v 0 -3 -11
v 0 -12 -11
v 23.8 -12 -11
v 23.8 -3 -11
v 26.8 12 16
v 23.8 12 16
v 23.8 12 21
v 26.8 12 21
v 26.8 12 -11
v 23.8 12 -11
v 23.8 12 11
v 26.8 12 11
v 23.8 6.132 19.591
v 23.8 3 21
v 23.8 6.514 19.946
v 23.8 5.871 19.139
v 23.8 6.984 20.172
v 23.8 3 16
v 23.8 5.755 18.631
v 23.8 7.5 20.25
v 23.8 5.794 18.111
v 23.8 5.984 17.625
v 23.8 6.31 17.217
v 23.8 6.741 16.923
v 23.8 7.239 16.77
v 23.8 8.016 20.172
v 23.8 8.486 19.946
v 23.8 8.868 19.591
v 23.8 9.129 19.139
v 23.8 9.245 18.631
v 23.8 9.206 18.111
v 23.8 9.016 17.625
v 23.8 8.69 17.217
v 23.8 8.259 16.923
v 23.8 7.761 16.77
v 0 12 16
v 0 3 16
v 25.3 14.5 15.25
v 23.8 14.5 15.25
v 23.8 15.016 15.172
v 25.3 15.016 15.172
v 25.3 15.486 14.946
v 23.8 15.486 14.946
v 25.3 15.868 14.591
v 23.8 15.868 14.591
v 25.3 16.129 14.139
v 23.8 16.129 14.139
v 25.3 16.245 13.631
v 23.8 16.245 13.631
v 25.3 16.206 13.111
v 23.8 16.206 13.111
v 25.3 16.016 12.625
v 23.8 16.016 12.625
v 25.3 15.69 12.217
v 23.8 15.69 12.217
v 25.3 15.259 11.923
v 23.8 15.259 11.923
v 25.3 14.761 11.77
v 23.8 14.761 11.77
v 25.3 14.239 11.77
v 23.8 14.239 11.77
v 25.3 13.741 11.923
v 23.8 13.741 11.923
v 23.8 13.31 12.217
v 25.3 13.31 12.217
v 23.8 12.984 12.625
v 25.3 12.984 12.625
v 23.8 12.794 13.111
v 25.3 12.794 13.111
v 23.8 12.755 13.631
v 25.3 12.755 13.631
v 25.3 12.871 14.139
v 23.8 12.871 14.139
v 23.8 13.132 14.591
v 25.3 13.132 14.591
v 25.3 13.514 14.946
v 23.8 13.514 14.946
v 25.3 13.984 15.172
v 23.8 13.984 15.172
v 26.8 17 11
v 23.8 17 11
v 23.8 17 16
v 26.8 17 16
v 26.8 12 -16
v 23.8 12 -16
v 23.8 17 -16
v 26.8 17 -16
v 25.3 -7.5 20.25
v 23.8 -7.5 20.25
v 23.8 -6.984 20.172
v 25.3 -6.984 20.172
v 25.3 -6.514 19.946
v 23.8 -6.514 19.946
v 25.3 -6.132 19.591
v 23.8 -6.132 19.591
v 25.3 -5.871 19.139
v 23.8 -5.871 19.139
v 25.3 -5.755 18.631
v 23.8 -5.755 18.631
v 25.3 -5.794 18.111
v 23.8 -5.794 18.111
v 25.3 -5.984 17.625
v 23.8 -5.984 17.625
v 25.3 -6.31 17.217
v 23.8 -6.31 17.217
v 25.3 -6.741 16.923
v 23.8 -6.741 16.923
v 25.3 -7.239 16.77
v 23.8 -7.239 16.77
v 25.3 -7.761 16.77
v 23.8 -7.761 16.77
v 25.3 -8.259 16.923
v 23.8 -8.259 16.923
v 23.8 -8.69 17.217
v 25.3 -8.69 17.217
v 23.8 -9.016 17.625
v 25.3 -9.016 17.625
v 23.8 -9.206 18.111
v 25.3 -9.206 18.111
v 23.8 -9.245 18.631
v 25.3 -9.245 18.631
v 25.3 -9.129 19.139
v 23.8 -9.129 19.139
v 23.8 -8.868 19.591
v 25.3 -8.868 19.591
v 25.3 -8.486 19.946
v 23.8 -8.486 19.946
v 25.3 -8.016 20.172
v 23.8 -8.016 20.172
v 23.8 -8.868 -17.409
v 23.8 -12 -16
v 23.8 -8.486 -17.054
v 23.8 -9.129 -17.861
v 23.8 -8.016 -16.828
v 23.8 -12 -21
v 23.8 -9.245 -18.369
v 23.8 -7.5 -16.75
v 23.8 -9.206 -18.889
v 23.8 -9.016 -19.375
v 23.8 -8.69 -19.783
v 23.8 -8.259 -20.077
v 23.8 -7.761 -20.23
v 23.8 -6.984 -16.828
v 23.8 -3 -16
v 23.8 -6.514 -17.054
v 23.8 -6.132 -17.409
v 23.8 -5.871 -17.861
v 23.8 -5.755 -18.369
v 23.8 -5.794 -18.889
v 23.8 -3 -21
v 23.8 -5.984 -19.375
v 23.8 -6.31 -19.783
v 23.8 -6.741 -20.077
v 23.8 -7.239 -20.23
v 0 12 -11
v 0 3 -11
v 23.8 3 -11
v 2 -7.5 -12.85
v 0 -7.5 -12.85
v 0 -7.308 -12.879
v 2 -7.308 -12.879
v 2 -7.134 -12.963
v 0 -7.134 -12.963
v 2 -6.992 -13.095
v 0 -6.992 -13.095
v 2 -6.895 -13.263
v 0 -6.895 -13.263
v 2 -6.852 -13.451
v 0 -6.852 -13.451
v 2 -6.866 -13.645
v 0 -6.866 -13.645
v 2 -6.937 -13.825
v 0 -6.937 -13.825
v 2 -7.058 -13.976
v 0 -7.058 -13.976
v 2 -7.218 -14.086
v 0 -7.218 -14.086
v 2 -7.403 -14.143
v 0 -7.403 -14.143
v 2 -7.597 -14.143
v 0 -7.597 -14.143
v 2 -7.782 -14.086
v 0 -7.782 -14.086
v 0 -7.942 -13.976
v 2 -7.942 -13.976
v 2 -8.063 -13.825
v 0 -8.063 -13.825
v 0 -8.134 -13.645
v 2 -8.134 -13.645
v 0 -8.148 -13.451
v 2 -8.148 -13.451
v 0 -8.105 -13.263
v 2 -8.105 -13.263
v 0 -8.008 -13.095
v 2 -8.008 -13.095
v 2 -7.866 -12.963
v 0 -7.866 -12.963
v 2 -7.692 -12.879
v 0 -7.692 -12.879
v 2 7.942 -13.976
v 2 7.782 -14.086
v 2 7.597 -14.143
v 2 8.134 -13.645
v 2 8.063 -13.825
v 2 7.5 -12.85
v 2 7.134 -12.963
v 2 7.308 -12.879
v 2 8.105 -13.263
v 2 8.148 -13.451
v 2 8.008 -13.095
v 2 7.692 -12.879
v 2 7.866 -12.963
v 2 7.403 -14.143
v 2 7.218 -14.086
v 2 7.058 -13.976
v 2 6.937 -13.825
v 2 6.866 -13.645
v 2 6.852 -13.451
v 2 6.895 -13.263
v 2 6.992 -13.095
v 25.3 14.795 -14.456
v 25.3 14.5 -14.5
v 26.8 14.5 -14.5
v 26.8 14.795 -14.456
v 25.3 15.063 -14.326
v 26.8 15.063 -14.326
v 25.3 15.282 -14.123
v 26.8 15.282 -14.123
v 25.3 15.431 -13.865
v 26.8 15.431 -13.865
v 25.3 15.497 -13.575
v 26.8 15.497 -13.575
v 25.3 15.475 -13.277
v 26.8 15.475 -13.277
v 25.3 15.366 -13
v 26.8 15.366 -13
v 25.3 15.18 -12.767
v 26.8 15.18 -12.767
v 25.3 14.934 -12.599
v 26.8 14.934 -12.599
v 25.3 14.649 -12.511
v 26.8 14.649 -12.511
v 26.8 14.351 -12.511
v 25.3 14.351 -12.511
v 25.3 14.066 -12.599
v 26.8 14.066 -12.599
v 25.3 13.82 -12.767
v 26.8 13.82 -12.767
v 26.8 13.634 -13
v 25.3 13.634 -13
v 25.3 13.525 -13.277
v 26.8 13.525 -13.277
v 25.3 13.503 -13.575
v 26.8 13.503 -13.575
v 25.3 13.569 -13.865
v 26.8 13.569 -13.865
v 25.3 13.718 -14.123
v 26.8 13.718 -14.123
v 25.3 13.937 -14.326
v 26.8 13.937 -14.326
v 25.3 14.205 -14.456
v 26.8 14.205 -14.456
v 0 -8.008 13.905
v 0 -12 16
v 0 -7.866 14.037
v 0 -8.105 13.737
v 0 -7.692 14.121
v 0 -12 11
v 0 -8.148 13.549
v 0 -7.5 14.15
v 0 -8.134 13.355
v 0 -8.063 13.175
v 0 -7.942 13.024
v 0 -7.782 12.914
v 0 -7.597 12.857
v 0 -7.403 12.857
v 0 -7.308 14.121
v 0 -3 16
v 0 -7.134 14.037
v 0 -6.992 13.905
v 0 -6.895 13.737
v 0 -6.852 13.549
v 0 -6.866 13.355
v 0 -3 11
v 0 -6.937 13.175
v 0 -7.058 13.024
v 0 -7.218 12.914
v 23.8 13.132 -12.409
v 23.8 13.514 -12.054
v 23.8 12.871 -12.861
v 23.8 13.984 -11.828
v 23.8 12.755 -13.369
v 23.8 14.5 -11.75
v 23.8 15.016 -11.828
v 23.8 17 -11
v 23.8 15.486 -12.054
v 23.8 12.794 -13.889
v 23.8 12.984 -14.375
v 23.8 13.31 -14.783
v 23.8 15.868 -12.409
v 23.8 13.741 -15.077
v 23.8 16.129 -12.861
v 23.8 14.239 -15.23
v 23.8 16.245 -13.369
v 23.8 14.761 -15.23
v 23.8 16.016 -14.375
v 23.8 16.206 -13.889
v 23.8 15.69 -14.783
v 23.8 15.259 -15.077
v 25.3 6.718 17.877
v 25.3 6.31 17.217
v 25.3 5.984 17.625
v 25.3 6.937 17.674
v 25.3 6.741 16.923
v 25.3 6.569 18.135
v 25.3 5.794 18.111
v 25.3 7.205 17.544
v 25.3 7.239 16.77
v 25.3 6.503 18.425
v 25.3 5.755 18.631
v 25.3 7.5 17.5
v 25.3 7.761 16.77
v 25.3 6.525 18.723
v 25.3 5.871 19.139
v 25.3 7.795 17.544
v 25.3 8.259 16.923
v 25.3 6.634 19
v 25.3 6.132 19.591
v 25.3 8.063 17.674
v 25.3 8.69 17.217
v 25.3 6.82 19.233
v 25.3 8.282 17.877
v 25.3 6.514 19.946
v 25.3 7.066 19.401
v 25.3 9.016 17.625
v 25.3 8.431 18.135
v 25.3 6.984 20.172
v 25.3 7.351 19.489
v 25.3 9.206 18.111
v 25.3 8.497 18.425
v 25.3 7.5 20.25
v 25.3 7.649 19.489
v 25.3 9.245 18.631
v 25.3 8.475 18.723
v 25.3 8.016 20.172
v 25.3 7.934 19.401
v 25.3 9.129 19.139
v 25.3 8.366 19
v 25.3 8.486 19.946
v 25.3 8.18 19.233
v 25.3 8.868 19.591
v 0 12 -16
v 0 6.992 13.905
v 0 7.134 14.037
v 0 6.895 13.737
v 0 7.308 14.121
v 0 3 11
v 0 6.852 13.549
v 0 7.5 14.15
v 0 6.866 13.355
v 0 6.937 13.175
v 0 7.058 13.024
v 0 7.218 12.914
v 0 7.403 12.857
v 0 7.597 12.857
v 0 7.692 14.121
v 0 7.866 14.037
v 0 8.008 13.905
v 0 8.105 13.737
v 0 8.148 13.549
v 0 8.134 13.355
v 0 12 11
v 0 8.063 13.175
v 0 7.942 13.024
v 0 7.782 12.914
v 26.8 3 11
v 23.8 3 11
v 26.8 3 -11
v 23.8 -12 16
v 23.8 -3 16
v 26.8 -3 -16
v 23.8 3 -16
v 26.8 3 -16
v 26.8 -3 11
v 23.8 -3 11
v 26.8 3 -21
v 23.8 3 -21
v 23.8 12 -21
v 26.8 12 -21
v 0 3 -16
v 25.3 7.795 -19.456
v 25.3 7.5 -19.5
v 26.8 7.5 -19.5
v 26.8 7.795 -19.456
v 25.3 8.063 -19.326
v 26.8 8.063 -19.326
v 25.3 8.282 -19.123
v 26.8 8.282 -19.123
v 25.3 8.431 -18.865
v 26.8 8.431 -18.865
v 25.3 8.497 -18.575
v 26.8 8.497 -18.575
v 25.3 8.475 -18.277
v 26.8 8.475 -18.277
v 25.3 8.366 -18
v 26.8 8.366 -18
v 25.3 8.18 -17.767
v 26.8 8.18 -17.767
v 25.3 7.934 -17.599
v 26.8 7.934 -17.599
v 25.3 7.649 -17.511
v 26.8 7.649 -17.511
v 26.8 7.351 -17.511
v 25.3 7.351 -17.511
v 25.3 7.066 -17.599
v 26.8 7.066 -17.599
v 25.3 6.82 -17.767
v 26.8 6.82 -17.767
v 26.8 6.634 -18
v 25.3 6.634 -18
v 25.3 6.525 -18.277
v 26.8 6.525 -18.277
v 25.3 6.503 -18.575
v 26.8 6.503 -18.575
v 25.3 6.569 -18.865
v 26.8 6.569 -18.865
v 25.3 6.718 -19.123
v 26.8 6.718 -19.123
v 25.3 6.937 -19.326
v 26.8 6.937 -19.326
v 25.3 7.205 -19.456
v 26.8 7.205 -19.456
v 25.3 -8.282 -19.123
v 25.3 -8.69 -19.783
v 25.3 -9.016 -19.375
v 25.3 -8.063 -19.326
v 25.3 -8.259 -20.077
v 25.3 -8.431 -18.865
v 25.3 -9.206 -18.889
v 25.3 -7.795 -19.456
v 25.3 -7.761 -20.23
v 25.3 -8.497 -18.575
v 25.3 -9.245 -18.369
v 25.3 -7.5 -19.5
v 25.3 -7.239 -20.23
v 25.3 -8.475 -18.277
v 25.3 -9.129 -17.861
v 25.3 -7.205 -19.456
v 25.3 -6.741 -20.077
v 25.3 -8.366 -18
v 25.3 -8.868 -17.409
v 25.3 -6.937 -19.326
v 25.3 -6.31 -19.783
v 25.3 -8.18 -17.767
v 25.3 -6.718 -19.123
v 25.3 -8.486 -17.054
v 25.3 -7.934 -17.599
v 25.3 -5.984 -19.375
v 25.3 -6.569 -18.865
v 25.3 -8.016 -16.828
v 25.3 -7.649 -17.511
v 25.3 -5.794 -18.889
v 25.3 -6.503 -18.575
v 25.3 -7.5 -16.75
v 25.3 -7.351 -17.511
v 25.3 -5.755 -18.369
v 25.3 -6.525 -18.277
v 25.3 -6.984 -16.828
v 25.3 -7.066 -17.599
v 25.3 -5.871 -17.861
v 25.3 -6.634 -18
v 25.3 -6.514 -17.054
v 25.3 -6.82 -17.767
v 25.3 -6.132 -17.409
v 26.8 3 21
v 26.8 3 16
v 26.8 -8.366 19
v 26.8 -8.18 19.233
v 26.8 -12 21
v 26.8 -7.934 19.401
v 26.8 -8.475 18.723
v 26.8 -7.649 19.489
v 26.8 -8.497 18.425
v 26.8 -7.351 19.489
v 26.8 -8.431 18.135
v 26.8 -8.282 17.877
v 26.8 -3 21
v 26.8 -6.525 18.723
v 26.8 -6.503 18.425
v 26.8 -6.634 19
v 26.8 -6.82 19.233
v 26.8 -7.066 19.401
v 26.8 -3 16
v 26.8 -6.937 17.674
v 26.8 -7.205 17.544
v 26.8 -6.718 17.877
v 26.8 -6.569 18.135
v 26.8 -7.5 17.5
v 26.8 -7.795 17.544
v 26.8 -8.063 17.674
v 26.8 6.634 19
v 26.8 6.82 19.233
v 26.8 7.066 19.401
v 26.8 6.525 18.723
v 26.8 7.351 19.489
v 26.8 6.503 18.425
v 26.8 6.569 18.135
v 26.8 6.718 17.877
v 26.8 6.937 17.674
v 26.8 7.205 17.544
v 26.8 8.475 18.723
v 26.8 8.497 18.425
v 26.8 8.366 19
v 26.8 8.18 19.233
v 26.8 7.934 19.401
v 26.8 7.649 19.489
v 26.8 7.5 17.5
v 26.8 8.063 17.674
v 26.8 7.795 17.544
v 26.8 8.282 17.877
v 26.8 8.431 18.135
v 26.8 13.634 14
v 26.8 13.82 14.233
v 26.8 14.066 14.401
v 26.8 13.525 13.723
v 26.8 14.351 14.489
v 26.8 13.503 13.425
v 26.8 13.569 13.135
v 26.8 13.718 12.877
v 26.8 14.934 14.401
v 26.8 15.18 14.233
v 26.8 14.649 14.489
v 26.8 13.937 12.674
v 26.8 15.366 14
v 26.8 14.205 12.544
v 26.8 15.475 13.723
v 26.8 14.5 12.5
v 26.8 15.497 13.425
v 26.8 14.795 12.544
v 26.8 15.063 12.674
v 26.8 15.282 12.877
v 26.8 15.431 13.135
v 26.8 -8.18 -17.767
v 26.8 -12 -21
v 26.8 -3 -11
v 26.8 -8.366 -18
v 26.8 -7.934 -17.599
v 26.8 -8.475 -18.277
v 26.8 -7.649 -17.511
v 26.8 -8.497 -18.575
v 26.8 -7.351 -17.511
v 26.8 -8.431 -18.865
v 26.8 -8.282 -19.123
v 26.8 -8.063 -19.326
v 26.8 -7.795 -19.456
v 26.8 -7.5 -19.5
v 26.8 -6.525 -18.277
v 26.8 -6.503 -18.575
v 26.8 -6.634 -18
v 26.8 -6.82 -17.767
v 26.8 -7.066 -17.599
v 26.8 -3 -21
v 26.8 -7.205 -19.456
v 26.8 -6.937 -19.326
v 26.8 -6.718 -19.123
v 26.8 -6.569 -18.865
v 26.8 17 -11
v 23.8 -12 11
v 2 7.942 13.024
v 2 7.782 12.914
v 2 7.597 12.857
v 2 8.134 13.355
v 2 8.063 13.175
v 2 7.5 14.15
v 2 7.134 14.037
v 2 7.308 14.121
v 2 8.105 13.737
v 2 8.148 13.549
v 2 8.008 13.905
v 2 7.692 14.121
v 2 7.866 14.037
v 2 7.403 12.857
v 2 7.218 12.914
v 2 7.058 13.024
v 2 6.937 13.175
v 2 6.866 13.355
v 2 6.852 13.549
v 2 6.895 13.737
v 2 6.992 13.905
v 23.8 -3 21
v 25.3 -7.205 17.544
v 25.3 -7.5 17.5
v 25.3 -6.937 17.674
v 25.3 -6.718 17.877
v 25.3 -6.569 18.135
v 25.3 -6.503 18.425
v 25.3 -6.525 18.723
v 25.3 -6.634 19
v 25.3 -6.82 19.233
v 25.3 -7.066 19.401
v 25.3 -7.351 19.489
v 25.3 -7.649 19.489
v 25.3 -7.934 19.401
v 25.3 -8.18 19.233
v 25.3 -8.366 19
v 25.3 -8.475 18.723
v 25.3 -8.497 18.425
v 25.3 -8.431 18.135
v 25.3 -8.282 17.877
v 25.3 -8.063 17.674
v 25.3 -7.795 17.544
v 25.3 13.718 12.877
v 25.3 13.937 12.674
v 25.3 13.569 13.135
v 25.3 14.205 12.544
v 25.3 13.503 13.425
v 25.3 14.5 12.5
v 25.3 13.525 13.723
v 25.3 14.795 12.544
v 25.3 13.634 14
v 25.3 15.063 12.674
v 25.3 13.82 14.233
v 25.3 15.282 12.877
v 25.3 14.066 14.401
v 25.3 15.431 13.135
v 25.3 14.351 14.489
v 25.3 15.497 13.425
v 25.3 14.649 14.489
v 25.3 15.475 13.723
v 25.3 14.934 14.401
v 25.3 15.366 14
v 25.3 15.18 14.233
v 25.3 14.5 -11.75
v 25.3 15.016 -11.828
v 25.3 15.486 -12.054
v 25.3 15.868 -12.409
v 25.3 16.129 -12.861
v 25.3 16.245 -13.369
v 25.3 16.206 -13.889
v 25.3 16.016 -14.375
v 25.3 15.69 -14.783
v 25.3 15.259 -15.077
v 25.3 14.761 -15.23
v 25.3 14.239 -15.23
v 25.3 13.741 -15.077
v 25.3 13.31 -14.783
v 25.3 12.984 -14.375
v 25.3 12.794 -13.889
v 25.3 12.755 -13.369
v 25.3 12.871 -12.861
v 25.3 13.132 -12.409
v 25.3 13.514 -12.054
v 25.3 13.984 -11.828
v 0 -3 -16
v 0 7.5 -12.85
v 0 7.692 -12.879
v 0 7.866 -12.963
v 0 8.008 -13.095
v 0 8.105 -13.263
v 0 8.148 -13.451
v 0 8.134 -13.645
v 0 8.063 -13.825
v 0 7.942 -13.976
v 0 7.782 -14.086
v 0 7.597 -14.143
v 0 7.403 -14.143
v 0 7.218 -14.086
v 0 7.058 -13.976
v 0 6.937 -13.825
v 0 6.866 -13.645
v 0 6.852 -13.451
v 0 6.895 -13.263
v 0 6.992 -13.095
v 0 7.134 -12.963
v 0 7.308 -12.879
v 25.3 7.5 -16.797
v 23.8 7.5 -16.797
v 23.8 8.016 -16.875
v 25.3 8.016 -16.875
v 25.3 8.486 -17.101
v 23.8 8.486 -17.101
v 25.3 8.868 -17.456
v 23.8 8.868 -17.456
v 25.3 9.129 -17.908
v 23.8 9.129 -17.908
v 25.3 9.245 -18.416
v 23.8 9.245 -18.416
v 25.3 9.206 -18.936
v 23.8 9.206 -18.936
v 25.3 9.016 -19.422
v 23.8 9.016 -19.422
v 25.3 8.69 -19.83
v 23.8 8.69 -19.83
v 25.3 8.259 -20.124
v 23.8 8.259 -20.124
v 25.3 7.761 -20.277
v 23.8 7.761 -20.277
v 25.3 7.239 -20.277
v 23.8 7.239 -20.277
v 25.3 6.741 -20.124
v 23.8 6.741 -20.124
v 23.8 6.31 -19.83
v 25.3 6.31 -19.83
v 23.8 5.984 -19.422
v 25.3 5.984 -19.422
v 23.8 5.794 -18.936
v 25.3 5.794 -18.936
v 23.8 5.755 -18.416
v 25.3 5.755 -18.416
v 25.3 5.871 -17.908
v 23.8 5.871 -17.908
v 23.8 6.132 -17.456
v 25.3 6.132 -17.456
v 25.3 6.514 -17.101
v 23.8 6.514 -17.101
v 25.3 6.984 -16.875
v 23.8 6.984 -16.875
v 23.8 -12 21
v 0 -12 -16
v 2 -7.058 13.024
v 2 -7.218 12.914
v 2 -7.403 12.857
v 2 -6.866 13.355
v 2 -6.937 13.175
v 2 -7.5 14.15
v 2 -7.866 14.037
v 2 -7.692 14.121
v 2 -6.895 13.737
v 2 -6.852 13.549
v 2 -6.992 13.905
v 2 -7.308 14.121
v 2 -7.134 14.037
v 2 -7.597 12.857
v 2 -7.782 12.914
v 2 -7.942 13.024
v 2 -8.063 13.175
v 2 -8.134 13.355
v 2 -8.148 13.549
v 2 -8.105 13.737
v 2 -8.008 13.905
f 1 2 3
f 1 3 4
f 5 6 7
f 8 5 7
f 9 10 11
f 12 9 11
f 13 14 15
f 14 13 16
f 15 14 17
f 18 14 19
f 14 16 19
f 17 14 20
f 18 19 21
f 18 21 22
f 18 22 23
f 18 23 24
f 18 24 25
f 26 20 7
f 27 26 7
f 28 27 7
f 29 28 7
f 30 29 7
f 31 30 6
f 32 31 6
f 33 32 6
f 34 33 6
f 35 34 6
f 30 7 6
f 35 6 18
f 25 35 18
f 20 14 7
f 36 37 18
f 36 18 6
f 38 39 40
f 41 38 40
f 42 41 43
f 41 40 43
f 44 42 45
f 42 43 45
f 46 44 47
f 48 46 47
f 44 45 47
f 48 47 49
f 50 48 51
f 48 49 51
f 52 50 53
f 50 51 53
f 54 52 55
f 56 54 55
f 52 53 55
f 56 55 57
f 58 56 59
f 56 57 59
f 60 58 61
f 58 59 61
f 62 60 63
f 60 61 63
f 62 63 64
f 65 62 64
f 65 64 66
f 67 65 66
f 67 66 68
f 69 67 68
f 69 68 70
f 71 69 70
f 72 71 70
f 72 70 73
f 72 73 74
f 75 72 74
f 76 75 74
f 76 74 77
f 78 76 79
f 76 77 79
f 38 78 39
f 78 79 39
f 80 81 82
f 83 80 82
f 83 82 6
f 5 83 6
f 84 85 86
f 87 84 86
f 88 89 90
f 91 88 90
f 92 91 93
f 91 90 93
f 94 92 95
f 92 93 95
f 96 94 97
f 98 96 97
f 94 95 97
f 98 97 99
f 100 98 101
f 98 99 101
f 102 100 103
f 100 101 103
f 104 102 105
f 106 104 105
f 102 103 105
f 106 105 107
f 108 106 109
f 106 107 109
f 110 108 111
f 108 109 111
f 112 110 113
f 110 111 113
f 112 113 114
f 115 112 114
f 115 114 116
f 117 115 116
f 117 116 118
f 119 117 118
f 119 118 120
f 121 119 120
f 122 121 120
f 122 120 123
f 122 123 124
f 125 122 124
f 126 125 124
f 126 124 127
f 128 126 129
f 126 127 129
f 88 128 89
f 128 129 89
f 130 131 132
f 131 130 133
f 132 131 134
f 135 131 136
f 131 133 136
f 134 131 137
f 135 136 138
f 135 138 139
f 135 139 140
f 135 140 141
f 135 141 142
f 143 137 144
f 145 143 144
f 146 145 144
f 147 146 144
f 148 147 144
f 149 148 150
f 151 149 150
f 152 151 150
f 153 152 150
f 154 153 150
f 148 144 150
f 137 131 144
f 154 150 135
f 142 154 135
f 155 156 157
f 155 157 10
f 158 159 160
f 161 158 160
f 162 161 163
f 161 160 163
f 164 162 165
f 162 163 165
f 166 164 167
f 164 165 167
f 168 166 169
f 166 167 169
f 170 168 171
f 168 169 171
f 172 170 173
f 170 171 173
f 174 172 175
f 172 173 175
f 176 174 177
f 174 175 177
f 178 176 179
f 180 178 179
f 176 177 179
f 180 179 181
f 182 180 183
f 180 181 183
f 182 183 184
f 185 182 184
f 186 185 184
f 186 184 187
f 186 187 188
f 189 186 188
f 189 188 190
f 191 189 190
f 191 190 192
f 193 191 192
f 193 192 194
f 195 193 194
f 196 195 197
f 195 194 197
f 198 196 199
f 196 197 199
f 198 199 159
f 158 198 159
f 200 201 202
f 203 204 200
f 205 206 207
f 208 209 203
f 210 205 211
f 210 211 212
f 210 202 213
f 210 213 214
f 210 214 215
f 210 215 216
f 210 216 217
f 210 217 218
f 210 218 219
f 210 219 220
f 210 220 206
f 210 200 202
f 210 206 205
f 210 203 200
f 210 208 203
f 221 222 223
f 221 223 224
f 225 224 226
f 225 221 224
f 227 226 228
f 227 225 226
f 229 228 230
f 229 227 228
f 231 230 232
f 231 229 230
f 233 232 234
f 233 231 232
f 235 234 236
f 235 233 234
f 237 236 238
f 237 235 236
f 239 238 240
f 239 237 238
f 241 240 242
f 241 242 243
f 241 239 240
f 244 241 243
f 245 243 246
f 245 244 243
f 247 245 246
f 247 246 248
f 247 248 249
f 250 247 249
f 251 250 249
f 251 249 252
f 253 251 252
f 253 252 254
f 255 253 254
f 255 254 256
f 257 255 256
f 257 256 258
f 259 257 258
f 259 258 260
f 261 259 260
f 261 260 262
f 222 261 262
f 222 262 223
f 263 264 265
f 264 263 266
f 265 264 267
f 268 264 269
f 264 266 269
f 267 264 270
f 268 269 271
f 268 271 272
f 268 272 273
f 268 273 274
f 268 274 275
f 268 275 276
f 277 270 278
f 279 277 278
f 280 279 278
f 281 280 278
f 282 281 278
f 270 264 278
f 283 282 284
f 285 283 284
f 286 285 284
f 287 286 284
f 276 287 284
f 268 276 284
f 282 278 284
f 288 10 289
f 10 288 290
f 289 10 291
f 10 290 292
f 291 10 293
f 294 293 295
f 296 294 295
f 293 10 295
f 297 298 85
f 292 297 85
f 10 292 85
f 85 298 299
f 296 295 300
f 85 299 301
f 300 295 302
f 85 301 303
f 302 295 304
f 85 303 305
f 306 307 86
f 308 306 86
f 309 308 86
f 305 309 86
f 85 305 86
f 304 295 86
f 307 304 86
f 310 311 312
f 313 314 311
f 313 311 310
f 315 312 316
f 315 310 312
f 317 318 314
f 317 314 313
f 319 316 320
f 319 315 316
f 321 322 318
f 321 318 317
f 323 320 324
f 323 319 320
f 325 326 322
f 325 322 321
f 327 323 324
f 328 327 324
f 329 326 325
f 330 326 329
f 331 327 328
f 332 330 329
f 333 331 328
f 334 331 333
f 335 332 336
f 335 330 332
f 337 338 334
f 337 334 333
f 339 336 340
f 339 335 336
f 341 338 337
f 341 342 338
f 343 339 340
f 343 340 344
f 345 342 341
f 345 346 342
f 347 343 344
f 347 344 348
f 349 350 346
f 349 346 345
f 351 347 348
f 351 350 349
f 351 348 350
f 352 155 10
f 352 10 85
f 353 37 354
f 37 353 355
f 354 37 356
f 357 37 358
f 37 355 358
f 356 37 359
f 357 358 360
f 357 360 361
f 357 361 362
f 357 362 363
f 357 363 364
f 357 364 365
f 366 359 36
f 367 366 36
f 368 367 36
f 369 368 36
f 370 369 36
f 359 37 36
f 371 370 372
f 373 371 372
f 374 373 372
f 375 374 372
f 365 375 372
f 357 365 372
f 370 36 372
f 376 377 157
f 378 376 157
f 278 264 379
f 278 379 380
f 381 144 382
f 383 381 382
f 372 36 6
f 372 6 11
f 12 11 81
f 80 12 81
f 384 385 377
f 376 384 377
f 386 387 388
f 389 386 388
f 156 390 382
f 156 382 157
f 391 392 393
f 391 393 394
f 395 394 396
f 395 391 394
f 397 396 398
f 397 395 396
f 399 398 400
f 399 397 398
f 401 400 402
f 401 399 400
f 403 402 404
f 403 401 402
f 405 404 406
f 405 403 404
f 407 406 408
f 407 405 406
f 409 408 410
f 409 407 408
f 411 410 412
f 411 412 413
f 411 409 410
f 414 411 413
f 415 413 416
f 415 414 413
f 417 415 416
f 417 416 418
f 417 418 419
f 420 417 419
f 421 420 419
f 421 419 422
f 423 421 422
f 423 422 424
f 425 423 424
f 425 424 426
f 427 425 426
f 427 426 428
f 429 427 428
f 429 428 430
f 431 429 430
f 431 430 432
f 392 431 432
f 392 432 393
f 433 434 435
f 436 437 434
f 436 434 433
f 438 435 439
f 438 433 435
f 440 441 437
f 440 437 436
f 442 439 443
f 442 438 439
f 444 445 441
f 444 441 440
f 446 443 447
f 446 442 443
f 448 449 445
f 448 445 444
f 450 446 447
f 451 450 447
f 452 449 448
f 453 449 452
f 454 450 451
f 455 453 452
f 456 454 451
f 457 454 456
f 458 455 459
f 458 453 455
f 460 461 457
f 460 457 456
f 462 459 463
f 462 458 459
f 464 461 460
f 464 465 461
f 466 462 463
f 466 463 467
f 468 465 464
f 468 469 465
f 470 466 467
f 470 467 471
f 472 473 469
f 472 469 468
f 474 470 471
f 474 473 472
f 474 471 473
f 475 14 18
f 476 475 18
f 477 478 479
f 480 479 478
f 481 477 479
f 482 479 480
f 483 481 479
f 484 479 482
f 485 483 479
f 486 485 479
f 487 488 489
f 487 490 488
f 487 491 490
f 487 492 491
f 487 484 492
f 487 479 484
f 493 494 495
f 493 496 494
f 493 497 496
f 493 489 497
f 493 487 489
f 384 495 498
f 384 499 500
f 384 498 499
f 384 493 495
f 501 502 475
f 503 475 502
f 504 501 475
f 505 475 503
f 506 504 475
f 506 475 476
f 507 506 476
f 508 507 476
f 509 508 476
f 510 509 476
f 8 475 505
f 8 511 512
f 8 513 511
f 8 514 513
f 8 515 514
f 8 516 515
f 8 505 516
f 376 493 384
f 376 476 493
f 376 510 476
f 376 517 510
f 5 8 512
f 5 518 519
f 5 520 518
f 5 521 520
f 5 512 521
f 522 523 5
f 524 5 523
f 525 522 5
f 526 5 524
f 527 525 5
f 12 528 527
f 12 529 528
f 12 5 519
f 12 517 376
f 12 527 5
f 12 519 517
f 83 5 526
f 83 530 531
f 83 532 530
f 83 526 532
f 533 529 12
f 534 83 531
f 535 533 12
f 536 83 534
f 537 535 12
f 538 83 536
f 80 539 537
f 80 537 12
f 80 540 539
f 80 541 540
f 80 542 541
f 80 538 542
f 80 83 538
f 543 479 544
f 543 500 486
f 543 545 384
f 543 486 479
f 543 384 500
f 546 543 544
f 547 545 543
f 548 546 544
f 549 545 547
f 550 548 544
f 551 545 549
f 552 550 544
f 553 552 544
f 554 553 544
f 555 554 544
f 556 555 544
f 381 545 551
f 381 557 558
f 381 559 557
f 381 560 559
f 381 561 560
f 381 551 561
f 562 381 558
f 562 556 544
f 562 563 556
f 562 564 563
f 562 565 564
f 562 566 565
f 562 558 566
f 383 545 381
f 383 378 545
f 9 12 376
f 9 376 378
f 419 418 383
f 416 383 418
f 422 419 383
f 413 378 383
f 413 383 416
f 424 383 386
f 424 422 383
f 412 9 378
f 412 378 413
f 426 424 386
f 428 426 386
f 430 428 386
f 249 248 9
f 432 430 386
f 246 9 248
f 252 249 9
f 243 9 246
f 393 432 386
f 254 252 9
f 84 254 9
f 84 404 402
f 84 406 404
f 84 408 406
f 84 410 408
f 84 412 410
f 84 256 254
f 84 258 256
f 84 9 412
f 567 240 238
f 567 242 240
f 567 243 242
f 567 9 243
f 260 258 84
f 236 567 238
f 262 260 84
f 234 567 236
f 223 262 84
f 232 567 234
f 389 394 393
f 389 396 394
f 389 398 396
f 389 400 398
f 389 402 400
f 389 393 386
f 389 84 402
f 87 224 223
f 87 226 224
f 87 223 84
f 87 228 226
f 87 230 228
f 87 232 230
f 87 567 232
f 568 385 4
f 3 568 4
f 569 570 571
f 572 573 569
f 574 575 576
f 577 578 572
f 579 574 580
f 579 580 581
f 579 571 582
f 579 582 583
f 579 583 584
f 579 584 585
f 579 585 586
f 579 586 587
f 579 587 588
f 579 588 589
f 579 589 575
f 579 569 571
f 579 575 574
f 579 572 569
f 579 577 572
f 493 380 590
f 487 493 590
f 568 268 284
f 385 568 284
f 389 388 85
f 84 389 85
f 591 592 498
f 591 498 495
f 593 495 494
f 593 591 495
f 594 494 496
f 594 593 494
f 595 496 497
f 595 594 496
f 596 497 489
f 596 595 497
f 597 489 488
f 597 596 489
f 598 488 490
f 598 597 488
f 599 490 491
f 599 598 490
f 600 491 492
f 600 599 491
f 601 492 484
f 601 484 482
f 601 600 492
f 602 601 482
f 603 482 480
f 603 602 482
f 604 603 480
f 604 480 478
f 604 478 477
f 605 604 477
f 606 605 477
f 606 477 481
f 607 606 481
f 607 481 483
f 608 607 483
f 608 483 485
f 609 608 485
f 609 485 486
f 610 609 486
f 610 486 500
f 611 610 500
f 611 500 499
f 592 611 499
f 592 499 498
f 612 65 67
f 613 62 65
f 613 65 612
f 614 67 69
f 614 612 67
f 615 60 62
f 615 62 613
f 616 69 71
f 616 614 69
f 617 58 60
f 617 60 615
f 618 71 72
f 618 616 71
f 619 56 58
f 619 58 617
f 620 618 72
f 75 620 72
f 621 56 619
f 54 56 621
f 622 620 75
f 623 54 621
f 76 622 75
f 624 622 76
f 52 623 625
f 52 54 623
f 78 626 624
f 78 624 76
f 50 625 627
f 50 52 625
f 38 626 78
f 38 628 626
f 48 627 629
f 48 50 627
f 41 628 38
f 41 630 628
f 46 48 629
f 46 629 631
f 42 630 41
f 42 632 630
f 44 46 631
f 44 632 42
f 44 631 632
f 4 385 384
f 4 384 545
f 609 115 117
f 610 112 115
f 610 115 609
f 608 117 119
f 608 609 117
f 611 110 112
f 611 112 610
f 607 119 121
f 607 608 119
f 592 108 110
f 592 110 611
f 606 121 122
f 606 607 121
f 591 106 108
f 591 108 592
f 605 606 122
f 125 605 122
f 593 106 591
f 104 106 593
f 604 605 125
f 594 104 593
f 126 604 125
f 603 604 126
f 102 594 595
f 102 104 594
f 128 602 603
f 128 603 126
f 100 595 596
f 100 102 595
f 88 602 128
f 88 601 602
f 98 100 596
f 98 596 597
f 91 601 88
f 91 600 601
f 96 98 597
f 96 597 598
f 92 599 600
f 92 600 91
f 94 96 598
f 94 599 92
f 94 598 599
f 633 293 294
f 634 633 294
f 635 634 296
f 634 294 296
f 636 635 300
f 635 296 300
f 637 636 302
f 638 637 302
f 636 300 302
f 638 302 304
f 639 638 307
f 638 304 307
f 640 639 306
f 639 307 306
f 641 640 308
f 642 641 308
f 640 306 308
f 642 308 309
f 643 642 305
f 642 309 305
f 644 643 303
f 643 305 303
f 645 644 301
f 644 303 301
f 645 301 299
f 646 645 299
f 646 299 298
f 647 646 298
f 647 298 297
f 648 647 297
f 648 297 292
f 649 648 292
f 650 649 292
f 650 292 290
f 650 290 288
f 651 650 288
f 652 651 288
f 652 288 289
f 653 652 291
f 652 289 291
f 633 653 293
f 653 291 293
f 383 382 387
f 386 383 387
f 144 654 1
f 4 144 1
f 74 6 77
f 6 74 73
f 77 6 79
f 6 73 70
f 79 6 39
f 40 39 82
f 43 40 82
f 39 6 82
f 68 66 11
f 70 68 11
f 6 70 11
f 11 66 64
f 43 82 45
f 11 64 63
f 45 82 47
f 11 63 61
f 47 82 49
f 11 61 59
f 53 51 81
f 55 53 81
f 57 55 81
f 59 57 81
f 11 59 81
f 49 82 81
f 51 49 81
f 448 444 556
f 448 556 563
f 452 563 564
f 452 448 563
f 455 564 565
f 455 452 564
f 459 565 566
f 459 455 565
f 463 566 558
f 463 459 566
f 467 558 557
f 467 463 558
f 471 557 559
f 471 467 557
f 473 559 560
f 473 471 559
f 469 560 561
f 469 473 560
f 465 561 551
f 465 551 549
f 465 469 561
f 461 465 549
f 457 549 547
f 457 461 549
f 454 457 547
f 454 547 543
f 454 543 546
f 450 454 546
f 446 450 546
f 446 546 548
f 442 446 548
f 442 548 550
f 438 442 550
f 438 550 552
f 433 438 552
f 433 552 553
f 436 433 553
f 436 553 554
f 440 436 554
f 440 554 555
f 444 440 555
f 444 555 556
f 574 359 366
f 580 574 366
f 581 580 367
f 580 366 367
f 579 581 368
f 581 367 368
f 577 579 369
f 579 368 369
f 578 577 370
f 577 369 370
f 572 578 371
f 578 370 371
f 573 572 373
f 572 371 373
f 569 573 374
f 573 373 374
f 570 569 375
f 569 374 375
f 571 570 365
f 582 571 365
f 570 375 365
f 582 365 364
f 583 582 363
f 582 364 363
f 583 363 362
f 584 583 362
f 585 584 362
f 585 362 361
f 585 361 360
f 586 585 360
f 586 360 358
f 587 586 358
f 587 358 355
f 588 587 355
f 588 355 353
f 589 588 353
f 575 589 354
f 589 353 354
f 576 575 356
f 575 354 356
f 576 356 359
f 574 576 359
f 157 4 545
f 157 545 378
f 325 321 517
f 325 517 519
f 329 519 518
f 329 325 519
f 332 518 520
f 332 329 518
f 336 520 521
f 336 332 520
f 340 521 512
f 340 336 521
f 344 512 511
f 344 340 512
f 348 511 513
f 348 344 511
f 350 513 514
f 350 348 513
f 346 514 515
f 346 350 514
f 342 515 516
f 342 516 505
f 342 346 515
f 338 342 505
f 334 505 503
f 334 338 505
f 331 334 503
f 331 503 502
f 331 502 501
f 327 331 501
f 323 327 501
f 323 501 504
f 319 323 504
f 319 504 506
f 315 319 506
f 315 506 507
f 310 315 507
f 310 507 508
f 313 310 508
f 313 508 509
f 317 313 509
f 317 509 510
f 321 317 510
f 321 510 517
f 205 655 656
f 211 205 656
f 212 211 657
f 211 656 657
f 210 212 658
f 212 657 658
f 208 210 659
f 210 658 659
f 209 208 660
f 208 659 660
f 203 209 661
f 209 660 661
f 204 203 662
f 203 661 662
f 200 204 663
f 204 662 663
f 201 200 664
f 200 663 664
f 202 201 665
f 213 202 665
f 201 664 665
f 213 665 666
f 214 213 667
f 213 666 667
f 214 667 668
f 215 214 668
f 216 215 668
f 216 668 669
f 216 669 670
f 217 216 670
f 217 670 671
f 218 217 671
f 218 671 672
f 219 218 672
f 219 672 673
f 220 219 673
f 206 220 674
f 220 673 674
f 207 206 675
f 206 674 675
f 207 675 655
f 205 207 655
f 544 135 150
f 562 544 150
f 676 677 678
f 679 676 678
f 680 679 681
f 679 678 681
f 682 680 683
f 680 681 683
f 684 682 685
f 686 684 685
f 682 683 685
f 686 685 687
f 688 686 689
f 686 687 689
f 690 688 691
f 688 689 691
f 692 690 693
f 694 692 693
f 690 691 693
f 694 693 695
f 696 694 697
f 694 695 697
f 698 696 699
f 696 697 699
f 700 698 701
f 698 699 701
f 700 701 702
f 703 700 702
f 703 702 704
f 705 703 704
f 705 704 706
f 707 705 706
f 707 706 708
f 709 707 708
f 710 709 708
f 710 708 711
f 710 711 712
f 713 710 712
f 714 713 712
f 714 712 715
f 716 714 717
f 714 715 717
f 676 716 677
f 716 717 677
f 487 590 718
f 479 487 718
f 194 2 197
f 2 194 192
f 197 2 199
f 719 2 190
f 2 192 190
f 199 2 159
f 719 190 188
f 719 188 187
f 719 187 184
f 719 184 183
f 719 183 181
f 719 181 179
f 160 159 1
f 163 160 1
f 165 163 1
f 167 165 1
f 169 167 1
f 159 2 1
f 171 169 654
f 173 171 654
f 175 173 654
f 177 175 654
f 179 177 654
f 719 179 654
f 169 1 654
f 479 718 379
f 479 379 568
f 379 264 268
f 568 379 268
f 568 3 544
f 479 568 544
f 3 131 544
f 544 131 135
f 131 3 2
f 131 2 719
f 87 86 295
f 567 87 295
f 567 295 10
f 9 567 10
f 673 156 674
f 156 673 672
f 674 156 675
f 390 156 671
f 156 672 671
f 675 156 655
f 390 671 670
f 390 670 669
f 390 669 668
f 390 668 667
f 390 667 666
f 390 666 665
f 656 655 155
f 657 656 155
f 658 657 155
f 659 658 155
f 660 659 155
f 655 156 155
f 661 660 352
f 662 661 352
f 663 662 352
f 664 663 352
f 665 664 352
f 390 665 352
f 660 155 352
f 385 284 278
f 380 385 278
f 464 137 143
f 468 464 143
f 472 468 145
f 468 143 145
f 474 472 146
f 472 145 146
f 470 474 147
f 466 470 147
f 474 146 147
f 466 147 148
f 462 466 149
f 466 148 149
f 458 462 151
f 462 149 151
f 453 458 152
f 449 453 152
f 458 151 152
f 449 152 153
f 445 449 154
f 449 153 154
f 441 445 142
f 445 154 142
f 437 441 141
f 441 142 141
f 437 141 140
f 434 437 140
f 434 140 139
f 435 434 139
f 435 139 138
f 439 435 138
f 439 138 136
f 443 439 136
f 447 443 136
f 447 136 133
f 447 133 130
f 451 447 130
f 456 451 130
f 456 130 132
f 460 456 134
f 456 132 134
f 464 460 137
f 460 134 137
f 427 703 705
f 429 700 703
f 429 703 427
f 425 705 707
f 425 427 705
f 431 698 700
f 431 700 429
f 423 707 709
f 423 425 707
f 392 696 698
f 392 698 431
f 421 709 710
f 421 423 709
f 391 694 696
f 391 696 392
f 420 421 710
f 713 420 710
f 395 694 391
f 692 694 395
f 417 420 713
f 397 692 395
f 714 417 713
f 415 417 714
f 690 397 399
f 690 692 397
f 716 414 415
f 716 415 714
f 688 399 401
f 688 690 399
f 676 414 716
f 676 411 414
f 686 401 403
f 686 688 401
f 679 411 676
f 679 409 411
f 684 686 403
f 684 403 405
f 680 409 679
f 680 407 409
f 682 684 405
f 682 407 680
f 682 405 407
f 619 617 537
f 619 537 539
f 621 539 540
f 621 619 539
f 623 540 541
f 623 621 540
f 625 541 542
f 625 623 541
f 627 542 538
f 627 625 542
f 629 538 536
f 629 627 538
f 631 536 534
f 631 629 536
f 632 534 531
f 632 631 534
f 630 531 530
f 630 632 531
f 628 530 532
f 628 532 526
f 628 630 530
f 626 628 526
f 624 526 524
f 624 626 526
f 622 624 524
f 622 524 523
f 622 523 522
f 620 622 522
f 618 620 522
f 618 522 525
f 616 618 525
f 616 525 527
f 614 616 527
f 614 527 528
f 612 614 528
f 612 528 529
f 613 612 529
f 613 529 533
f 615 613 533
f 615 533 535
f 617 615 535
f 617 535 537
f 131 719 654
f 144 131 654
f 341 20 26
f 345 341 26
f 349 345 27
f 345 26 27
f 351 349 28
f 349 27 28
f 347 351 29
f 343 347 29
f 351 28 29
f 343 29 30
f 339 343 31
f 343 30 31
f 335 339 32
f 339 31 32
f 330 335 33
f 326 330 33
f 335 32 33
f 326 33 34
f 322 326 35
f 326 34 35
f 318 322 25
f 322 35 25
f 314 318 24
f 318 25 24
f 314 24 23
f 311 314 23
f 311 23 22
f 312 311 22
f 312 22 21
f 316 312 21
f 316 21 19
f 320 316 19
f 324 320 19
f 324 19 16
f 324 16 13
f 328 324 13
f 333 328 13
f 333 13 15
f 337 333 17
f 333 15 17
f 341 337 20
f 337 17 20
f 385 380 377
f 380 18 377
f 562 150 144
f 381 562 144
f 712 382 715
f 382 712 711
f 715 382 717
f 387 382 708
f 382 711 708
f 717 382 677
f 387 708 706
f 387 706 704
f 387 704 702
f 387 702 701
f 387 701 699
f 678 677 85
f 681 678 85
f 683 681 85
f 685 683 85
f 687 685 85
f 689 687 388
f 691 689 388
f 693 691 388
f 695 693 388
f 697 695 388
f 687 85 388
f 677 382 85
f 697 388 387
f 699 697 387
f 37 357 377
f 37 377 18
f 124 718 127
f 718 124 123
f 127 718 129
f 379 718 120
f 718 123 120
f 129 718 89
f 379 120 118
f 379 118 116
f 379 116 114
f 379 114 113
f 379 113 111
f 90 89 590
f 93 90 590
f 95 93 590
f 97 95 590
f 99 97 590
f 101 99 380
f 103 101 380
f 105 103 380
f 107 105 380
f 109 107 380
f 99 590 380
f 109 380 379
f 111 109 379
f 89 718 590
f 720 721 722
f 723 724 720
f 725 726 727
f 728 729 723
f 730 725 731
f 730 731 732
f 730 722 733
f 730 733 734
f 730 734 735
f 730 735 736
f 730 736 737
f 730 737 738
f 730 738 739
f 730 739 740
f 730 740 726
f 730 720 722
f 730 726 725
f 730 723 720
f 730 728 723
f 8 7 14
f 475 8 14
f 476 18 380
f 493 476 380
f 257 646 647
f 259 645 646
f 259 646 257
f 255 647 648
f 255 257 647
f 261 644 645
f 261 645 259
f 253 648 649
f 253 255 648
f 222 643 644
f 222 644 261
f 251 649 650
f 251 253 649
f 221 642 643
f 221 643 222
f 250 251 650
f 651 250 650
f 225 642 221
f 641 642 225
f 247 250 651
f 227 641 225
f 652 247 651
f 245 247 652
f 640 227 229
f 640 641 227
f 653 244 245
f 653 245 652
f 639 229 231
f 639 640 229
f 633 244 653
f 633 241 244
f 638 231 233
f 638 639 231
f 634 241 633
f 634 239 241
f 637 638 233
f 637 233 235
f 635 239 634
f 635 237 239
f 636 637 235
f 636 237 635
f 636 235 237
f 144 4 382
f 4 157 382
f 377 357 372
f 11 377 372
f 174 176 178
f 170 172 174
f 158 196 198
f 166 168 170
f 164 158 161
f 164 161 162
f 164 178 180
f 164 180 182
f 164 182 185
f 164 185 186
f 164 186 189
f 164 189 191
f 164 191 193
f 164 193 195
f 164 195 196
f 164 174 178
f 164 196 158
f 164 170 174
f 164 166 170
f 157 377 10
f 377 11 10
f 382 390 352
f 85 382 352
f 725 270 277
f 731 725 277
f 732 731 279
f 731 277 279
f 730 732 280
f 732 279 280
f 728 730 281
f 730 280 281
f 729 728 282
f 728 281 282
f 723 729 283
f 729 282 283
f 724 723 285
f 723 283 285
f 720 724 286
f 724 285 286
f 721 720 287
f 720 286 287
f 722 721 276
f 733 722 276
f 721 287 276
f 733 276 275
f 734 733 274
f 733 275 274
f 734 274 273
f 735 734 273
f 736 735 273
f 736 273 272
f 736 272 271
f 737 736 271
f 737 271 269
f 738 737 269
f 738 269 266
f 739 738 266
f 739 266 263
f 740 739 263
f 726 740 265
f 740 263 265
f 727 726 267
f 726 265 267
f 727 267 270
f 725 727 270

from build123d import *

# Parameters (mm, degrees)
SKETCH_1_W           = 32
SKETCH_1_H           = 24
EXTRUDE_1_DEPTH      = 23.8
SKETCH_7_R           = 0.65
CUT_EXTRUDE_1_DEPTH  = 2
SKETCH_8_OUTSIDE_W   = 43.31
SKETCH_8_OUTSIDE_H   = 35.31
SKETCH_8_OUTSIDE_W_2 = 5
SKETCH_8_OUTSIDE_H_2 = 9
CUT_EXTRUDE_2_DEPTH  = 32.087618114
SKETCH_9_R           = 1
SKETCH_9_W           = 22
SKETCH_9_H           = 6
EXTRUDE_2_DEPTH      = 3
SKETCH_11_R          = 1.75
CUT_EXTRUDE_3_DEPTH  = 1.5


with BuildPart() as part:
    # 草图1 → 凸台-拉伸1 (new body)
    with BuildSketch(Plane(origin=(0, 0, 0), x_dir=(0, 0, -1), z_dir=(1, 0, 0))):
        Rectangle(SKETCH_1_W, SKETCH_1_H)
    extrude(amount=EXTRUDE_1_DEPTH)

    # 草图7 → 切除-拉伸1 (cut)
    with BuildSketch(Plane.ZY):
        with Locations((13.5, 7.5)):
            Circle(SKETCH_7_R)
        with Locations((13.5, -7.5)):
            Circle(SKETCH_7_R)
        with Locations((-13.5, -7.5)):
            Circle(SKETCH_7_R)
        with Locations((-13.5, 7.5)):
            Circle(SKETCH_7_R)
    extrude(amount=-CUT_EXTRUDE_1_DEPTH, mode=Mode.SUBTRACT)

    # 草图8 outside → 切除-拉伸2 (cut, through all)
    with BuildSketch(Plane.ZY):
        Rectangle(SKETCH_8_OUTSIDE_W, SKETCH_8_OUTSIDE_H)
        with Locations((-13.5, -7.5)):
            Rectangle(SKETCH_8_OUTSIDE_W_2, SKETCH_8_OUTSIDE_H_2, mode=Mode.SUBTRACT)
        with Locations((-13.5, 7.5)):
            Rectangle(SKETCH_8_OUTSIDE_W_2, SKETCH_8_OUTSIDE_H_2, mode=Mode.SUBTRACT)
        with Locations((13.5, -7.5)):
            Rectangle(SKETCH_8_OUTSIDE_W_2, SKETCH_8_OUTSIDE_H_2, mode=Mode.SUBTRACT)
        with Locations((13.5, 7.5)):
            Rectangle(SKETCH_8_OUTSIDE_W_2, SKETCH_8_OUTSIDE_H_2, mode=Mode.SUBTRACT)
    extrude(amount=-CUT_EXTRUDE_2_DEPTH, mode=Mode.SUBTRACT)


with BuildPart() as cut_extrude_2_piece_1:
    # of the separate pieces the step leaves, piece 1, a body of its own (cut_extrude_2_pieces)
    add(part.part.solids().sort_by_distance((0, 12, 16))[0])



with BuildPart() as cut_extrude_2_piece_2:
    # of the separate pieces the step leaves, piece 2, a body of its own (cut_extrude_2_pieces)
    add(part.part.solids().sort_by_distance((0, -12, 16))[0])


with BuildPart() as cut_extrude_2_piece_3:
    # of the separate pieces the step leaves, piece 3, a body of its own (cut_extrude_2_pieces)
    add(part.part.solids().sort_by_distance((0, 3, -11))[0])


with BuildPart() as cut_extrude_2_piece_4:
    # of the separate pieces the step leaves, piece 4, a body of its own (cut_extrude_2_pieces)
    add(part.part.solids().sort_by_distance((0, -12, -11))[0])


with BuildPart() as cut_extrude_2_piece_1_1:
    add(cut_extrude_2_piece_1.part)

    add(cut_extrude_2_piece_2.part)  # 凸台-拉伸2 merges 切除-拉伸2 piece 2

    add(cut_extrude_2_piece_3.part)  # 凸台-拉伸2 merges 切除-拉伸2 piece 3

    add(cut_extrude_2_piece_4.part)  # 凸台-拉伸2 merges 切除-拉伸2 piece 4
    # 草图9 → 凸台-拉伸2 (add)
    with BuildSketch(Plane(origin=(23.8, 0, 0), x_dir=(0, 0, -1), z_dir=(1, 0, 0))):
        Polygon((16, -3), (16, 3), (21, 3), (21, 12), (16, 12), (16, 17), (11, 17), (11, 12), (-11, 12), (-11, 17), (-16, 17), (-16, 12), (-21, 12), (-21, 3), (-16, 3), (-16, -3), (-21, -3), (-21, -12), (21, -12), (21, -3), align=None)
        with Locations((18.5, 7.5)):
            Circle(SKETCH_9_R, mode=Mode.SUBTRACT)
        with Locations((13.5, 14.5)):
            Circle(SKETCH_9_R, mode=Mode.SUBTRACT)
        with Locations((-18.5, -7.5)):
            Circle(SKETCH_9_R, mode=Mode.SUBTRACT)
        with Locations((18.5, -7.5)):
            Circle(SKETCH_9_R, mode=Mode.SUBTRACT)
        Rectangle(SKETCH_9_W, SKETCH_9_H, mode=Mode.SUBTRACT)
        with Locations((-18.5, 7.5)):
            Circle(SKETCH_9_R, mode=Mode.SUBTRACT)
        with Locations((-13.5, 14.5)):
            Circle(SKETCH_9_R, mode=Mode.SUBTRACT)
    extrude(amount=EXTRUDE_2_DEPTH)

    # 草图11 → 切除-拉伸3 (cut)
    with BuildSketch(Plane.ZY.offset(-23.8)):
        with Locations((-18.5, -7.5)):
            Circle(SKETCH_11_R)
        with Locations((-13.5, -14.5)):
            Circle(SKETCH_11_R)
        with Locations((-18.546966213, 7.5)):
            Circle(SKETCH_11_R)
        with Locations((13.5, -14.5)):
            Circle(SKETCH_11_R)
        with Locations((18.5, -7.5)):
            Circle(SKETCH_11_R)
        with Locations((18.5, 7.5)):
            Circle(SKETCH_11_R)
        with Locations((13.5, 14.5)):
            Circle(SKETCH_11_R)
        with Locations((-13.5, 14.5)):
            Circle(SKETCH_11_R)
    extrude(amount=-CUT_EXTRUDE_3_DEPTH, mode=Mode.SUBTRACT)


solid = cut_extrude_2_piece_1_1.part
